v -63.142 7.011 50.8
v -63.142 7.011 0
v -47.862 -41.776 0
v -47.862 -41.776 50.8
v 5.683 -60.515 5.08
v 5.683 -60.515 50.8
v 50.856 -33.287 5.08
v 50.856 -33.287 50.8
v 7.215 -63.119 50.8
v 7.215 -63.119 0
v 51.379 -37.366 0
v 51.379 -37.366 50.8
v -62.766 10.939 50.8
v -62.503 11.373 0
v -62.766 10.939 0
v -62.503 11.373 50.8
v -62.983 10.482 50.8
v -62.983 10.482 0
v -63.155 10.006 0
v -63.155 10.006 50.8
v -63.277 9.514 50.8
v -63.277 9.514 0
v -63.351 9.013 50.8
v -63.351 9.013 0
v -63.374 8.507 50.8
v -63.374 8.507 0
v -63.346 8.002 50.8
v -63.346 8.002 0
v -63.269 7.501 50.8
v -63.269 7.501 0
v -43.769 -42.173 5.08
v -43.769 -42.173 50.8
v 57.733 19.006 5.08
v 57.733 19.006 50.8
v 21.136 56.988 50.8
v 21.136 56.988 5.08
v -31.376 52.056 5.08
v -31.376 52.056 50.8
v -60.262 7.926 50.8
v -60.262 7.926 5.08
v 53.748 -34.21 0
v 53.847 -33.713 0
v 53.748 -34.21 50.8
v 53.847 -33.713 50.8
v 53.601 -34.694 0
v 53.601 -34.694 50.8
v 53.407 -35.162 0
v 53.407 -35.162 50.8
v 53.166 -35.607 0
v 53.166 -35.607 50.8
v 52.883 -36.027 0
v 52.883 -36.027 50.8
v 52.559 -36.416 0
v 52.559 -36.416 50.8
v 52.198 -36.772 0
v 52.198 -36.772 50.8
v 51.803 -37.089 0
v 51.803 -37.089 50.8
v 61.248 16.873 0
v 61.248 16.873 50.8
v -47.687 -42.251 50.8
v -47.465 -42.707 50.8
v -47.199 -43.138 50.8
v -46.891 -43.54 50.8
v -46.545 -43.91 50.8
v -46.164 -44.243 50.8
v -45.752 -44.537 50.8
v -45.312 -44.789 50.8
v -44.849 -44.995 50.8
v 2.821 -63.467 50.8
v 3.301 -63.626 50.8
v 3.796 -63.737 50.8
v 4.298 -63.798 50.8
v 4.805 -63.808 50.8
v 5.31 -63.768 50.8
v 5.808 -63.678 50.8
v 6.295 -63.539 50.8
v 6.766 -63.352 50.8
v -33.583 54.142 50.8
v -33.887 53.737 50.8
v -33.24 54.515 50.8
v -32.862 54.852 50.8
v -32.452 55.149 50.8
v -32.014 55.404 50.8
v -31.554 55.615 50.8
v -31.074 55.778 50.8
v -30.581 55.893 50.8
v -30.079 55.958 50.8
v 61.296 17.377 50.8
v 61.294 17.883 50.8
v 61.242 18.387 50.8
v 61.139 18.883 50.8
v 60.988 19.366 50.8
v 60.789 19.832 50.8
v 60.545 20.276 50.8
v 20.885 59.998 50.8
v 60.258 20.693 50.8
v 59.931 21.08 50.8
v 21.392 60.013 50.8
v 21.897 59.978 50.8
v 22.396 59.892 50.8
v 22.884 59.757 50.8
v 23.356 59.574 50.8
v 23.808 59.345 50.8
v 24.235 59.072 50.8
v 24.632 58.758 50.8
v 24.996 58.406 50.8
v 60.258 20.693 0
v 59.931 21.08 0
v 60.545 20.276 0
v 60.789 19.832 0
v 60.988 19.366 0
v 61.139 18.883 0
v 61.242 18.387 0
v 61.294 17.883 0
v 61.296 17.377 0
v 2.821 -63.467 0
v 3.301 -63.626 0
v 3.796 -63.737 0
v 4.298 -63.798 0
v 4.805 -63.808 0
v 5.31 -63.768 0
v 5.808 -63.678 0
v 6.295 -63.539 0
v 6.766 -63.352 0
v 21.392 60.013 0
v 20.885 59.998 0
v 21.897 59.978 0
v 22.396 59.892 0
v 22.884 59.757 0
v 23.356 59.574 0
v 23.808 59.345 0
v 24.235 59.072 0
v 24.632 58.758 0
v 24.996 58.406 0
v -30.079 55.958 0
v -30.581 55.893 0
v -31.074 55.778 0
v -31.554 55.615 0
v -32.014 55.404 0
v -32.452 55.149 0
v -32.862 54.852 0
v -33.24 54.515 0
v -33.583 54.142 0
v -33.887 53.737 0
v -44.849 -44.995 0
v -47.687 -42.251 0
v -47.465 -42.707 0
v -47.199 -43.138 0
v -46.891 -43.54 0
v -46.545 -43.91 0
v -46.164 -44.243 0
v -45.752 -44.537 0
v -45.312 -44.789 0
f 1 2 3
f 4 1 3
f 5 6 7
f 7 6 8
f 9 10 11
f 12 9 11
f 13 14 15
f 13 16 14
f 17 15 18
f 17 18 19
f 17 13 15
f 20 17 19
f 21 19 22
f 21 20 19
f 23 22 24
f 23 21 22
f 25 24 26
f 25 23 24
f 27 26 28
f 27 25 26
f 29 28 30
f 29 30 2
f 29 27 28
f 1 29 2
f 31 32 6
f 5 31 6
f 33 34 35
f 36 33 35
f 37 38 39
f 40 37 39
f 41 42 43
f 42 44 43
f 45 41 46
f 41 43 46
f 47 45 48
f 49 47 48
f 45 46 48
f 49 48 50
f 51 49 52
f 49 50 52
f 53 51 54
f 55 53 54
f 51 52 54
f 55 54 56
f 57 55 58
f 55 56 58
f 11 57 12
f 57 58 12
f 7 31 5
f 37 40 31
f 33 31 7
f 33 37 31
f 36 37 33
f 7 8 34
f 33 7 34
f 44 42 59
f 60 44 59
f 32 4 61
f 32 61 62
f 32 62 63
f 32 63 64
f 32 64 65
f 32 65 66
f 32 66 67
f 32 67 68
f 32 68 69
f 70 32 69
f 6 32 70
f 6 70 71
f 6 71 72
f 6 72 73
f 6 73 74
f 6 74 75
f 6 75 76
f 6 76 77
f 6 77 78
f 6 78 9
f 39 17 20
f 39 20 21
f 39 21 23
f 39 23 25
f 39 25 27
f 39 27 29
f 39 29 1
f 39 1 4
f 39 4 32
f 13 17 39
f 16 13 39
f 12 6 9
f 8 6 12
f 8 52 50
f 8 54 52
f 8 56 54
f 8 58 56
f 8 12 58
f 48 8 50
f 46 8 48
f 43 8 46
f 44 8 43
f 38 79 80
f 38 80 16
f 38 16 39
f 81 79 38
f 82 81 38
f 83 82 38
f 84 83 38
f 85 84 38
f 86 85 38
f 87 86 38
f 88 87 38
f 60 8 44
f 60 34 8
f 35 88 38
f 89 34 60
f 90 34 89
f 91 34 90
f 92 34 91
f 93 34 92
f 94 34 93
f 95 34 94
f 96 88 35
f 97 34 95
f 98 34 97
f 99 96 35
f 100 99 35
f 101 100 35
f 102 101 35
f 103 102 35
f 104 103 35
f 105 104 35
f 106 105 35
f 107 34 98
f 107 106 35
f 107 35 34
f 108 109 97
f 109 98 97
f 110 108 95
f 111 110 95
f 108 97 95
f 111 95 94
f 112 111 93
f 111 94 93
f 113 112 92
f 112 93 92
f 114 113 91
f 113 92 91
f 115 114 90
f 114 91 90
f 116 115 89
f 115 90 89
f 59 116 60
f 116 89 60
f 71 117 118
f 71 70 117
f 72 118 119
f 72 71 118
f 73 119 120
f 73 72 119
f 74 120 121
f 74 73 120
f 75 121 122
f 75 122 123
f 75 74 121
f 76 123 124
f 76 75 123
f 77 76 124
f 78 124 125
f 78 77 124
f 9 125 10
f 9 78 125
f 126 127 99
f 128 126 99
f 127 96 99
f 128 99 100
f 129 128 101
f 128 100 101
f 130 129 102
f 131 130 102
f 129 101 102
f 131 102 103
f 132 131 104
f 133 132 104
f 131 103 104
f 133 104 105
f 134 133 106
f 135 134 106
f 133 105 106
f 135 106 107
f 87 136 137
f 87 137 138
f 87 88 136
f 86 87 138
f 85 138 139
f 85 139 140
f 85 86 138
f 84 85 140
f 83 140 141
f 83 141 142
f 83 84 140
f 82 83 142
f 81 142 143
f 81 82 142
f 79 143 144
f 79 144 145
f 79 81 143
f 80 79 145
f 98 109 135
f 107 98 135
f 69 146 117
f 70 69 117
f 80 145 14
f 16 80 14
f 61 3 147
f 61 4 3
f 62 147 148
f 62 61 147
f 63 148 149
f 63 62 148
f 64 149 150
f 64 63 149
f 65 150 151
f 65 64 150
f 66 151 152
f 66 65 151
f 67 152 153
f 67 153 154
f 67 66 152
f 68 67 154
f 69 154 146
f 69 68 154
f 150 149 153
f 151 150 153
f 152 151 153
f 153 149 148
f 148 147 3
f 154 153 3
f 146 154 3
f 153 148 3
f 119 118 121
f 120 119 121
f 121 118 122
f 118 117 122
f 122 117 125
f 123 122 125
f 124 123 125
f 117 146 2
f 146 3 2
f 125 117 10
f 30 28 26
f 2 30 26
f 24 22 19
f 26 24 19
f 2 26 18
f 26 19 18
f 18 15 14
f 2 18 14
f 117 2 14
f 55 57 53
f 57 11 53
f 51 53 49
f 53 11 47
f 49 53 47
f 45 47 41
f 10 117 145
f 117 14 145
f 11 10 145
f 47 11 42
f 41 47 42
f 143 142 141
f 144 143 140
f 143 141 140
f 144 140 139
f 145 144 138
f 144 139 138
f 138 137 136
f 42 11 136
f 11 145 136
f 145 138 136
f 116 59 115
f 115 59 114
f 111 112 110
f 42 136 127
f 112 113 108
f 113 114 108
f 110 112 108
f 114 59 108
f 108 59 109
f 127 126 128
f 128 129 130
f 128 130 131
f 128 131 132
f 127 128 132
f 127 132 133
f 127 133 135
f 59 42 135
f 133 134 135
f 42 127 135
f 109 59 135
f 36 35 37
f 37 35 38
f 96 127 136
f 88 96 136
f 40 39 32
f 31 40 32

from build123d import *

# Parameters (mm, degrees)
F1_DEPTH = 50.8
F3_DEPTH = 45.72
F4_R     = 5.08


with BuildPart() as f1:
    # F0 (on Top) → F1 (new body)
    with BuildSketch(Plane.XY):
        Polygon((23.324189, 60.191778), (-32.517433, 55.764545), (-63.872765, 9.345472), (-47.130602, -44.110932), (5.101866, -64.350904), (53.492524, -36.133333), (61.602221, 19.293375), align=None)
    extrude(amount=F1_DEPTH)

    # F2 (on face) → F3 (cut)
    with BuildSketch(Plane.XY.offset(50.8)):
        Polygon((21.136437, 56.987757), (-31.37647, 52.056417), (-60.262255, 7.925533), (-43.769332, -42.173439), (5.68279, -60.514951), (50.855655, -33.287471), (57.733175, 19.006154), align=None)
    extrude(amount=-F3_DEPTH, mode=Mode.SUBTRACT)

    # F4
    f4_edges = [f1.edges().sort_by_distance(p)[0] for p in [
        (-63.872765, 9.345472, 25.4),
        (-32.517433, 55.764545, 25.4),
        (23.324189, 60.191778, 25.4),
        (61.602221, 19.293375, 25.4),
        (53.492524, -36.133333, 25.4),
        (-47.130602, -44.110932, 25.4),
        (5.101866, -64.350904, 25.4),
    ]]
    fillet(f4_edges, radius=F4_R)


solid = f1.part
